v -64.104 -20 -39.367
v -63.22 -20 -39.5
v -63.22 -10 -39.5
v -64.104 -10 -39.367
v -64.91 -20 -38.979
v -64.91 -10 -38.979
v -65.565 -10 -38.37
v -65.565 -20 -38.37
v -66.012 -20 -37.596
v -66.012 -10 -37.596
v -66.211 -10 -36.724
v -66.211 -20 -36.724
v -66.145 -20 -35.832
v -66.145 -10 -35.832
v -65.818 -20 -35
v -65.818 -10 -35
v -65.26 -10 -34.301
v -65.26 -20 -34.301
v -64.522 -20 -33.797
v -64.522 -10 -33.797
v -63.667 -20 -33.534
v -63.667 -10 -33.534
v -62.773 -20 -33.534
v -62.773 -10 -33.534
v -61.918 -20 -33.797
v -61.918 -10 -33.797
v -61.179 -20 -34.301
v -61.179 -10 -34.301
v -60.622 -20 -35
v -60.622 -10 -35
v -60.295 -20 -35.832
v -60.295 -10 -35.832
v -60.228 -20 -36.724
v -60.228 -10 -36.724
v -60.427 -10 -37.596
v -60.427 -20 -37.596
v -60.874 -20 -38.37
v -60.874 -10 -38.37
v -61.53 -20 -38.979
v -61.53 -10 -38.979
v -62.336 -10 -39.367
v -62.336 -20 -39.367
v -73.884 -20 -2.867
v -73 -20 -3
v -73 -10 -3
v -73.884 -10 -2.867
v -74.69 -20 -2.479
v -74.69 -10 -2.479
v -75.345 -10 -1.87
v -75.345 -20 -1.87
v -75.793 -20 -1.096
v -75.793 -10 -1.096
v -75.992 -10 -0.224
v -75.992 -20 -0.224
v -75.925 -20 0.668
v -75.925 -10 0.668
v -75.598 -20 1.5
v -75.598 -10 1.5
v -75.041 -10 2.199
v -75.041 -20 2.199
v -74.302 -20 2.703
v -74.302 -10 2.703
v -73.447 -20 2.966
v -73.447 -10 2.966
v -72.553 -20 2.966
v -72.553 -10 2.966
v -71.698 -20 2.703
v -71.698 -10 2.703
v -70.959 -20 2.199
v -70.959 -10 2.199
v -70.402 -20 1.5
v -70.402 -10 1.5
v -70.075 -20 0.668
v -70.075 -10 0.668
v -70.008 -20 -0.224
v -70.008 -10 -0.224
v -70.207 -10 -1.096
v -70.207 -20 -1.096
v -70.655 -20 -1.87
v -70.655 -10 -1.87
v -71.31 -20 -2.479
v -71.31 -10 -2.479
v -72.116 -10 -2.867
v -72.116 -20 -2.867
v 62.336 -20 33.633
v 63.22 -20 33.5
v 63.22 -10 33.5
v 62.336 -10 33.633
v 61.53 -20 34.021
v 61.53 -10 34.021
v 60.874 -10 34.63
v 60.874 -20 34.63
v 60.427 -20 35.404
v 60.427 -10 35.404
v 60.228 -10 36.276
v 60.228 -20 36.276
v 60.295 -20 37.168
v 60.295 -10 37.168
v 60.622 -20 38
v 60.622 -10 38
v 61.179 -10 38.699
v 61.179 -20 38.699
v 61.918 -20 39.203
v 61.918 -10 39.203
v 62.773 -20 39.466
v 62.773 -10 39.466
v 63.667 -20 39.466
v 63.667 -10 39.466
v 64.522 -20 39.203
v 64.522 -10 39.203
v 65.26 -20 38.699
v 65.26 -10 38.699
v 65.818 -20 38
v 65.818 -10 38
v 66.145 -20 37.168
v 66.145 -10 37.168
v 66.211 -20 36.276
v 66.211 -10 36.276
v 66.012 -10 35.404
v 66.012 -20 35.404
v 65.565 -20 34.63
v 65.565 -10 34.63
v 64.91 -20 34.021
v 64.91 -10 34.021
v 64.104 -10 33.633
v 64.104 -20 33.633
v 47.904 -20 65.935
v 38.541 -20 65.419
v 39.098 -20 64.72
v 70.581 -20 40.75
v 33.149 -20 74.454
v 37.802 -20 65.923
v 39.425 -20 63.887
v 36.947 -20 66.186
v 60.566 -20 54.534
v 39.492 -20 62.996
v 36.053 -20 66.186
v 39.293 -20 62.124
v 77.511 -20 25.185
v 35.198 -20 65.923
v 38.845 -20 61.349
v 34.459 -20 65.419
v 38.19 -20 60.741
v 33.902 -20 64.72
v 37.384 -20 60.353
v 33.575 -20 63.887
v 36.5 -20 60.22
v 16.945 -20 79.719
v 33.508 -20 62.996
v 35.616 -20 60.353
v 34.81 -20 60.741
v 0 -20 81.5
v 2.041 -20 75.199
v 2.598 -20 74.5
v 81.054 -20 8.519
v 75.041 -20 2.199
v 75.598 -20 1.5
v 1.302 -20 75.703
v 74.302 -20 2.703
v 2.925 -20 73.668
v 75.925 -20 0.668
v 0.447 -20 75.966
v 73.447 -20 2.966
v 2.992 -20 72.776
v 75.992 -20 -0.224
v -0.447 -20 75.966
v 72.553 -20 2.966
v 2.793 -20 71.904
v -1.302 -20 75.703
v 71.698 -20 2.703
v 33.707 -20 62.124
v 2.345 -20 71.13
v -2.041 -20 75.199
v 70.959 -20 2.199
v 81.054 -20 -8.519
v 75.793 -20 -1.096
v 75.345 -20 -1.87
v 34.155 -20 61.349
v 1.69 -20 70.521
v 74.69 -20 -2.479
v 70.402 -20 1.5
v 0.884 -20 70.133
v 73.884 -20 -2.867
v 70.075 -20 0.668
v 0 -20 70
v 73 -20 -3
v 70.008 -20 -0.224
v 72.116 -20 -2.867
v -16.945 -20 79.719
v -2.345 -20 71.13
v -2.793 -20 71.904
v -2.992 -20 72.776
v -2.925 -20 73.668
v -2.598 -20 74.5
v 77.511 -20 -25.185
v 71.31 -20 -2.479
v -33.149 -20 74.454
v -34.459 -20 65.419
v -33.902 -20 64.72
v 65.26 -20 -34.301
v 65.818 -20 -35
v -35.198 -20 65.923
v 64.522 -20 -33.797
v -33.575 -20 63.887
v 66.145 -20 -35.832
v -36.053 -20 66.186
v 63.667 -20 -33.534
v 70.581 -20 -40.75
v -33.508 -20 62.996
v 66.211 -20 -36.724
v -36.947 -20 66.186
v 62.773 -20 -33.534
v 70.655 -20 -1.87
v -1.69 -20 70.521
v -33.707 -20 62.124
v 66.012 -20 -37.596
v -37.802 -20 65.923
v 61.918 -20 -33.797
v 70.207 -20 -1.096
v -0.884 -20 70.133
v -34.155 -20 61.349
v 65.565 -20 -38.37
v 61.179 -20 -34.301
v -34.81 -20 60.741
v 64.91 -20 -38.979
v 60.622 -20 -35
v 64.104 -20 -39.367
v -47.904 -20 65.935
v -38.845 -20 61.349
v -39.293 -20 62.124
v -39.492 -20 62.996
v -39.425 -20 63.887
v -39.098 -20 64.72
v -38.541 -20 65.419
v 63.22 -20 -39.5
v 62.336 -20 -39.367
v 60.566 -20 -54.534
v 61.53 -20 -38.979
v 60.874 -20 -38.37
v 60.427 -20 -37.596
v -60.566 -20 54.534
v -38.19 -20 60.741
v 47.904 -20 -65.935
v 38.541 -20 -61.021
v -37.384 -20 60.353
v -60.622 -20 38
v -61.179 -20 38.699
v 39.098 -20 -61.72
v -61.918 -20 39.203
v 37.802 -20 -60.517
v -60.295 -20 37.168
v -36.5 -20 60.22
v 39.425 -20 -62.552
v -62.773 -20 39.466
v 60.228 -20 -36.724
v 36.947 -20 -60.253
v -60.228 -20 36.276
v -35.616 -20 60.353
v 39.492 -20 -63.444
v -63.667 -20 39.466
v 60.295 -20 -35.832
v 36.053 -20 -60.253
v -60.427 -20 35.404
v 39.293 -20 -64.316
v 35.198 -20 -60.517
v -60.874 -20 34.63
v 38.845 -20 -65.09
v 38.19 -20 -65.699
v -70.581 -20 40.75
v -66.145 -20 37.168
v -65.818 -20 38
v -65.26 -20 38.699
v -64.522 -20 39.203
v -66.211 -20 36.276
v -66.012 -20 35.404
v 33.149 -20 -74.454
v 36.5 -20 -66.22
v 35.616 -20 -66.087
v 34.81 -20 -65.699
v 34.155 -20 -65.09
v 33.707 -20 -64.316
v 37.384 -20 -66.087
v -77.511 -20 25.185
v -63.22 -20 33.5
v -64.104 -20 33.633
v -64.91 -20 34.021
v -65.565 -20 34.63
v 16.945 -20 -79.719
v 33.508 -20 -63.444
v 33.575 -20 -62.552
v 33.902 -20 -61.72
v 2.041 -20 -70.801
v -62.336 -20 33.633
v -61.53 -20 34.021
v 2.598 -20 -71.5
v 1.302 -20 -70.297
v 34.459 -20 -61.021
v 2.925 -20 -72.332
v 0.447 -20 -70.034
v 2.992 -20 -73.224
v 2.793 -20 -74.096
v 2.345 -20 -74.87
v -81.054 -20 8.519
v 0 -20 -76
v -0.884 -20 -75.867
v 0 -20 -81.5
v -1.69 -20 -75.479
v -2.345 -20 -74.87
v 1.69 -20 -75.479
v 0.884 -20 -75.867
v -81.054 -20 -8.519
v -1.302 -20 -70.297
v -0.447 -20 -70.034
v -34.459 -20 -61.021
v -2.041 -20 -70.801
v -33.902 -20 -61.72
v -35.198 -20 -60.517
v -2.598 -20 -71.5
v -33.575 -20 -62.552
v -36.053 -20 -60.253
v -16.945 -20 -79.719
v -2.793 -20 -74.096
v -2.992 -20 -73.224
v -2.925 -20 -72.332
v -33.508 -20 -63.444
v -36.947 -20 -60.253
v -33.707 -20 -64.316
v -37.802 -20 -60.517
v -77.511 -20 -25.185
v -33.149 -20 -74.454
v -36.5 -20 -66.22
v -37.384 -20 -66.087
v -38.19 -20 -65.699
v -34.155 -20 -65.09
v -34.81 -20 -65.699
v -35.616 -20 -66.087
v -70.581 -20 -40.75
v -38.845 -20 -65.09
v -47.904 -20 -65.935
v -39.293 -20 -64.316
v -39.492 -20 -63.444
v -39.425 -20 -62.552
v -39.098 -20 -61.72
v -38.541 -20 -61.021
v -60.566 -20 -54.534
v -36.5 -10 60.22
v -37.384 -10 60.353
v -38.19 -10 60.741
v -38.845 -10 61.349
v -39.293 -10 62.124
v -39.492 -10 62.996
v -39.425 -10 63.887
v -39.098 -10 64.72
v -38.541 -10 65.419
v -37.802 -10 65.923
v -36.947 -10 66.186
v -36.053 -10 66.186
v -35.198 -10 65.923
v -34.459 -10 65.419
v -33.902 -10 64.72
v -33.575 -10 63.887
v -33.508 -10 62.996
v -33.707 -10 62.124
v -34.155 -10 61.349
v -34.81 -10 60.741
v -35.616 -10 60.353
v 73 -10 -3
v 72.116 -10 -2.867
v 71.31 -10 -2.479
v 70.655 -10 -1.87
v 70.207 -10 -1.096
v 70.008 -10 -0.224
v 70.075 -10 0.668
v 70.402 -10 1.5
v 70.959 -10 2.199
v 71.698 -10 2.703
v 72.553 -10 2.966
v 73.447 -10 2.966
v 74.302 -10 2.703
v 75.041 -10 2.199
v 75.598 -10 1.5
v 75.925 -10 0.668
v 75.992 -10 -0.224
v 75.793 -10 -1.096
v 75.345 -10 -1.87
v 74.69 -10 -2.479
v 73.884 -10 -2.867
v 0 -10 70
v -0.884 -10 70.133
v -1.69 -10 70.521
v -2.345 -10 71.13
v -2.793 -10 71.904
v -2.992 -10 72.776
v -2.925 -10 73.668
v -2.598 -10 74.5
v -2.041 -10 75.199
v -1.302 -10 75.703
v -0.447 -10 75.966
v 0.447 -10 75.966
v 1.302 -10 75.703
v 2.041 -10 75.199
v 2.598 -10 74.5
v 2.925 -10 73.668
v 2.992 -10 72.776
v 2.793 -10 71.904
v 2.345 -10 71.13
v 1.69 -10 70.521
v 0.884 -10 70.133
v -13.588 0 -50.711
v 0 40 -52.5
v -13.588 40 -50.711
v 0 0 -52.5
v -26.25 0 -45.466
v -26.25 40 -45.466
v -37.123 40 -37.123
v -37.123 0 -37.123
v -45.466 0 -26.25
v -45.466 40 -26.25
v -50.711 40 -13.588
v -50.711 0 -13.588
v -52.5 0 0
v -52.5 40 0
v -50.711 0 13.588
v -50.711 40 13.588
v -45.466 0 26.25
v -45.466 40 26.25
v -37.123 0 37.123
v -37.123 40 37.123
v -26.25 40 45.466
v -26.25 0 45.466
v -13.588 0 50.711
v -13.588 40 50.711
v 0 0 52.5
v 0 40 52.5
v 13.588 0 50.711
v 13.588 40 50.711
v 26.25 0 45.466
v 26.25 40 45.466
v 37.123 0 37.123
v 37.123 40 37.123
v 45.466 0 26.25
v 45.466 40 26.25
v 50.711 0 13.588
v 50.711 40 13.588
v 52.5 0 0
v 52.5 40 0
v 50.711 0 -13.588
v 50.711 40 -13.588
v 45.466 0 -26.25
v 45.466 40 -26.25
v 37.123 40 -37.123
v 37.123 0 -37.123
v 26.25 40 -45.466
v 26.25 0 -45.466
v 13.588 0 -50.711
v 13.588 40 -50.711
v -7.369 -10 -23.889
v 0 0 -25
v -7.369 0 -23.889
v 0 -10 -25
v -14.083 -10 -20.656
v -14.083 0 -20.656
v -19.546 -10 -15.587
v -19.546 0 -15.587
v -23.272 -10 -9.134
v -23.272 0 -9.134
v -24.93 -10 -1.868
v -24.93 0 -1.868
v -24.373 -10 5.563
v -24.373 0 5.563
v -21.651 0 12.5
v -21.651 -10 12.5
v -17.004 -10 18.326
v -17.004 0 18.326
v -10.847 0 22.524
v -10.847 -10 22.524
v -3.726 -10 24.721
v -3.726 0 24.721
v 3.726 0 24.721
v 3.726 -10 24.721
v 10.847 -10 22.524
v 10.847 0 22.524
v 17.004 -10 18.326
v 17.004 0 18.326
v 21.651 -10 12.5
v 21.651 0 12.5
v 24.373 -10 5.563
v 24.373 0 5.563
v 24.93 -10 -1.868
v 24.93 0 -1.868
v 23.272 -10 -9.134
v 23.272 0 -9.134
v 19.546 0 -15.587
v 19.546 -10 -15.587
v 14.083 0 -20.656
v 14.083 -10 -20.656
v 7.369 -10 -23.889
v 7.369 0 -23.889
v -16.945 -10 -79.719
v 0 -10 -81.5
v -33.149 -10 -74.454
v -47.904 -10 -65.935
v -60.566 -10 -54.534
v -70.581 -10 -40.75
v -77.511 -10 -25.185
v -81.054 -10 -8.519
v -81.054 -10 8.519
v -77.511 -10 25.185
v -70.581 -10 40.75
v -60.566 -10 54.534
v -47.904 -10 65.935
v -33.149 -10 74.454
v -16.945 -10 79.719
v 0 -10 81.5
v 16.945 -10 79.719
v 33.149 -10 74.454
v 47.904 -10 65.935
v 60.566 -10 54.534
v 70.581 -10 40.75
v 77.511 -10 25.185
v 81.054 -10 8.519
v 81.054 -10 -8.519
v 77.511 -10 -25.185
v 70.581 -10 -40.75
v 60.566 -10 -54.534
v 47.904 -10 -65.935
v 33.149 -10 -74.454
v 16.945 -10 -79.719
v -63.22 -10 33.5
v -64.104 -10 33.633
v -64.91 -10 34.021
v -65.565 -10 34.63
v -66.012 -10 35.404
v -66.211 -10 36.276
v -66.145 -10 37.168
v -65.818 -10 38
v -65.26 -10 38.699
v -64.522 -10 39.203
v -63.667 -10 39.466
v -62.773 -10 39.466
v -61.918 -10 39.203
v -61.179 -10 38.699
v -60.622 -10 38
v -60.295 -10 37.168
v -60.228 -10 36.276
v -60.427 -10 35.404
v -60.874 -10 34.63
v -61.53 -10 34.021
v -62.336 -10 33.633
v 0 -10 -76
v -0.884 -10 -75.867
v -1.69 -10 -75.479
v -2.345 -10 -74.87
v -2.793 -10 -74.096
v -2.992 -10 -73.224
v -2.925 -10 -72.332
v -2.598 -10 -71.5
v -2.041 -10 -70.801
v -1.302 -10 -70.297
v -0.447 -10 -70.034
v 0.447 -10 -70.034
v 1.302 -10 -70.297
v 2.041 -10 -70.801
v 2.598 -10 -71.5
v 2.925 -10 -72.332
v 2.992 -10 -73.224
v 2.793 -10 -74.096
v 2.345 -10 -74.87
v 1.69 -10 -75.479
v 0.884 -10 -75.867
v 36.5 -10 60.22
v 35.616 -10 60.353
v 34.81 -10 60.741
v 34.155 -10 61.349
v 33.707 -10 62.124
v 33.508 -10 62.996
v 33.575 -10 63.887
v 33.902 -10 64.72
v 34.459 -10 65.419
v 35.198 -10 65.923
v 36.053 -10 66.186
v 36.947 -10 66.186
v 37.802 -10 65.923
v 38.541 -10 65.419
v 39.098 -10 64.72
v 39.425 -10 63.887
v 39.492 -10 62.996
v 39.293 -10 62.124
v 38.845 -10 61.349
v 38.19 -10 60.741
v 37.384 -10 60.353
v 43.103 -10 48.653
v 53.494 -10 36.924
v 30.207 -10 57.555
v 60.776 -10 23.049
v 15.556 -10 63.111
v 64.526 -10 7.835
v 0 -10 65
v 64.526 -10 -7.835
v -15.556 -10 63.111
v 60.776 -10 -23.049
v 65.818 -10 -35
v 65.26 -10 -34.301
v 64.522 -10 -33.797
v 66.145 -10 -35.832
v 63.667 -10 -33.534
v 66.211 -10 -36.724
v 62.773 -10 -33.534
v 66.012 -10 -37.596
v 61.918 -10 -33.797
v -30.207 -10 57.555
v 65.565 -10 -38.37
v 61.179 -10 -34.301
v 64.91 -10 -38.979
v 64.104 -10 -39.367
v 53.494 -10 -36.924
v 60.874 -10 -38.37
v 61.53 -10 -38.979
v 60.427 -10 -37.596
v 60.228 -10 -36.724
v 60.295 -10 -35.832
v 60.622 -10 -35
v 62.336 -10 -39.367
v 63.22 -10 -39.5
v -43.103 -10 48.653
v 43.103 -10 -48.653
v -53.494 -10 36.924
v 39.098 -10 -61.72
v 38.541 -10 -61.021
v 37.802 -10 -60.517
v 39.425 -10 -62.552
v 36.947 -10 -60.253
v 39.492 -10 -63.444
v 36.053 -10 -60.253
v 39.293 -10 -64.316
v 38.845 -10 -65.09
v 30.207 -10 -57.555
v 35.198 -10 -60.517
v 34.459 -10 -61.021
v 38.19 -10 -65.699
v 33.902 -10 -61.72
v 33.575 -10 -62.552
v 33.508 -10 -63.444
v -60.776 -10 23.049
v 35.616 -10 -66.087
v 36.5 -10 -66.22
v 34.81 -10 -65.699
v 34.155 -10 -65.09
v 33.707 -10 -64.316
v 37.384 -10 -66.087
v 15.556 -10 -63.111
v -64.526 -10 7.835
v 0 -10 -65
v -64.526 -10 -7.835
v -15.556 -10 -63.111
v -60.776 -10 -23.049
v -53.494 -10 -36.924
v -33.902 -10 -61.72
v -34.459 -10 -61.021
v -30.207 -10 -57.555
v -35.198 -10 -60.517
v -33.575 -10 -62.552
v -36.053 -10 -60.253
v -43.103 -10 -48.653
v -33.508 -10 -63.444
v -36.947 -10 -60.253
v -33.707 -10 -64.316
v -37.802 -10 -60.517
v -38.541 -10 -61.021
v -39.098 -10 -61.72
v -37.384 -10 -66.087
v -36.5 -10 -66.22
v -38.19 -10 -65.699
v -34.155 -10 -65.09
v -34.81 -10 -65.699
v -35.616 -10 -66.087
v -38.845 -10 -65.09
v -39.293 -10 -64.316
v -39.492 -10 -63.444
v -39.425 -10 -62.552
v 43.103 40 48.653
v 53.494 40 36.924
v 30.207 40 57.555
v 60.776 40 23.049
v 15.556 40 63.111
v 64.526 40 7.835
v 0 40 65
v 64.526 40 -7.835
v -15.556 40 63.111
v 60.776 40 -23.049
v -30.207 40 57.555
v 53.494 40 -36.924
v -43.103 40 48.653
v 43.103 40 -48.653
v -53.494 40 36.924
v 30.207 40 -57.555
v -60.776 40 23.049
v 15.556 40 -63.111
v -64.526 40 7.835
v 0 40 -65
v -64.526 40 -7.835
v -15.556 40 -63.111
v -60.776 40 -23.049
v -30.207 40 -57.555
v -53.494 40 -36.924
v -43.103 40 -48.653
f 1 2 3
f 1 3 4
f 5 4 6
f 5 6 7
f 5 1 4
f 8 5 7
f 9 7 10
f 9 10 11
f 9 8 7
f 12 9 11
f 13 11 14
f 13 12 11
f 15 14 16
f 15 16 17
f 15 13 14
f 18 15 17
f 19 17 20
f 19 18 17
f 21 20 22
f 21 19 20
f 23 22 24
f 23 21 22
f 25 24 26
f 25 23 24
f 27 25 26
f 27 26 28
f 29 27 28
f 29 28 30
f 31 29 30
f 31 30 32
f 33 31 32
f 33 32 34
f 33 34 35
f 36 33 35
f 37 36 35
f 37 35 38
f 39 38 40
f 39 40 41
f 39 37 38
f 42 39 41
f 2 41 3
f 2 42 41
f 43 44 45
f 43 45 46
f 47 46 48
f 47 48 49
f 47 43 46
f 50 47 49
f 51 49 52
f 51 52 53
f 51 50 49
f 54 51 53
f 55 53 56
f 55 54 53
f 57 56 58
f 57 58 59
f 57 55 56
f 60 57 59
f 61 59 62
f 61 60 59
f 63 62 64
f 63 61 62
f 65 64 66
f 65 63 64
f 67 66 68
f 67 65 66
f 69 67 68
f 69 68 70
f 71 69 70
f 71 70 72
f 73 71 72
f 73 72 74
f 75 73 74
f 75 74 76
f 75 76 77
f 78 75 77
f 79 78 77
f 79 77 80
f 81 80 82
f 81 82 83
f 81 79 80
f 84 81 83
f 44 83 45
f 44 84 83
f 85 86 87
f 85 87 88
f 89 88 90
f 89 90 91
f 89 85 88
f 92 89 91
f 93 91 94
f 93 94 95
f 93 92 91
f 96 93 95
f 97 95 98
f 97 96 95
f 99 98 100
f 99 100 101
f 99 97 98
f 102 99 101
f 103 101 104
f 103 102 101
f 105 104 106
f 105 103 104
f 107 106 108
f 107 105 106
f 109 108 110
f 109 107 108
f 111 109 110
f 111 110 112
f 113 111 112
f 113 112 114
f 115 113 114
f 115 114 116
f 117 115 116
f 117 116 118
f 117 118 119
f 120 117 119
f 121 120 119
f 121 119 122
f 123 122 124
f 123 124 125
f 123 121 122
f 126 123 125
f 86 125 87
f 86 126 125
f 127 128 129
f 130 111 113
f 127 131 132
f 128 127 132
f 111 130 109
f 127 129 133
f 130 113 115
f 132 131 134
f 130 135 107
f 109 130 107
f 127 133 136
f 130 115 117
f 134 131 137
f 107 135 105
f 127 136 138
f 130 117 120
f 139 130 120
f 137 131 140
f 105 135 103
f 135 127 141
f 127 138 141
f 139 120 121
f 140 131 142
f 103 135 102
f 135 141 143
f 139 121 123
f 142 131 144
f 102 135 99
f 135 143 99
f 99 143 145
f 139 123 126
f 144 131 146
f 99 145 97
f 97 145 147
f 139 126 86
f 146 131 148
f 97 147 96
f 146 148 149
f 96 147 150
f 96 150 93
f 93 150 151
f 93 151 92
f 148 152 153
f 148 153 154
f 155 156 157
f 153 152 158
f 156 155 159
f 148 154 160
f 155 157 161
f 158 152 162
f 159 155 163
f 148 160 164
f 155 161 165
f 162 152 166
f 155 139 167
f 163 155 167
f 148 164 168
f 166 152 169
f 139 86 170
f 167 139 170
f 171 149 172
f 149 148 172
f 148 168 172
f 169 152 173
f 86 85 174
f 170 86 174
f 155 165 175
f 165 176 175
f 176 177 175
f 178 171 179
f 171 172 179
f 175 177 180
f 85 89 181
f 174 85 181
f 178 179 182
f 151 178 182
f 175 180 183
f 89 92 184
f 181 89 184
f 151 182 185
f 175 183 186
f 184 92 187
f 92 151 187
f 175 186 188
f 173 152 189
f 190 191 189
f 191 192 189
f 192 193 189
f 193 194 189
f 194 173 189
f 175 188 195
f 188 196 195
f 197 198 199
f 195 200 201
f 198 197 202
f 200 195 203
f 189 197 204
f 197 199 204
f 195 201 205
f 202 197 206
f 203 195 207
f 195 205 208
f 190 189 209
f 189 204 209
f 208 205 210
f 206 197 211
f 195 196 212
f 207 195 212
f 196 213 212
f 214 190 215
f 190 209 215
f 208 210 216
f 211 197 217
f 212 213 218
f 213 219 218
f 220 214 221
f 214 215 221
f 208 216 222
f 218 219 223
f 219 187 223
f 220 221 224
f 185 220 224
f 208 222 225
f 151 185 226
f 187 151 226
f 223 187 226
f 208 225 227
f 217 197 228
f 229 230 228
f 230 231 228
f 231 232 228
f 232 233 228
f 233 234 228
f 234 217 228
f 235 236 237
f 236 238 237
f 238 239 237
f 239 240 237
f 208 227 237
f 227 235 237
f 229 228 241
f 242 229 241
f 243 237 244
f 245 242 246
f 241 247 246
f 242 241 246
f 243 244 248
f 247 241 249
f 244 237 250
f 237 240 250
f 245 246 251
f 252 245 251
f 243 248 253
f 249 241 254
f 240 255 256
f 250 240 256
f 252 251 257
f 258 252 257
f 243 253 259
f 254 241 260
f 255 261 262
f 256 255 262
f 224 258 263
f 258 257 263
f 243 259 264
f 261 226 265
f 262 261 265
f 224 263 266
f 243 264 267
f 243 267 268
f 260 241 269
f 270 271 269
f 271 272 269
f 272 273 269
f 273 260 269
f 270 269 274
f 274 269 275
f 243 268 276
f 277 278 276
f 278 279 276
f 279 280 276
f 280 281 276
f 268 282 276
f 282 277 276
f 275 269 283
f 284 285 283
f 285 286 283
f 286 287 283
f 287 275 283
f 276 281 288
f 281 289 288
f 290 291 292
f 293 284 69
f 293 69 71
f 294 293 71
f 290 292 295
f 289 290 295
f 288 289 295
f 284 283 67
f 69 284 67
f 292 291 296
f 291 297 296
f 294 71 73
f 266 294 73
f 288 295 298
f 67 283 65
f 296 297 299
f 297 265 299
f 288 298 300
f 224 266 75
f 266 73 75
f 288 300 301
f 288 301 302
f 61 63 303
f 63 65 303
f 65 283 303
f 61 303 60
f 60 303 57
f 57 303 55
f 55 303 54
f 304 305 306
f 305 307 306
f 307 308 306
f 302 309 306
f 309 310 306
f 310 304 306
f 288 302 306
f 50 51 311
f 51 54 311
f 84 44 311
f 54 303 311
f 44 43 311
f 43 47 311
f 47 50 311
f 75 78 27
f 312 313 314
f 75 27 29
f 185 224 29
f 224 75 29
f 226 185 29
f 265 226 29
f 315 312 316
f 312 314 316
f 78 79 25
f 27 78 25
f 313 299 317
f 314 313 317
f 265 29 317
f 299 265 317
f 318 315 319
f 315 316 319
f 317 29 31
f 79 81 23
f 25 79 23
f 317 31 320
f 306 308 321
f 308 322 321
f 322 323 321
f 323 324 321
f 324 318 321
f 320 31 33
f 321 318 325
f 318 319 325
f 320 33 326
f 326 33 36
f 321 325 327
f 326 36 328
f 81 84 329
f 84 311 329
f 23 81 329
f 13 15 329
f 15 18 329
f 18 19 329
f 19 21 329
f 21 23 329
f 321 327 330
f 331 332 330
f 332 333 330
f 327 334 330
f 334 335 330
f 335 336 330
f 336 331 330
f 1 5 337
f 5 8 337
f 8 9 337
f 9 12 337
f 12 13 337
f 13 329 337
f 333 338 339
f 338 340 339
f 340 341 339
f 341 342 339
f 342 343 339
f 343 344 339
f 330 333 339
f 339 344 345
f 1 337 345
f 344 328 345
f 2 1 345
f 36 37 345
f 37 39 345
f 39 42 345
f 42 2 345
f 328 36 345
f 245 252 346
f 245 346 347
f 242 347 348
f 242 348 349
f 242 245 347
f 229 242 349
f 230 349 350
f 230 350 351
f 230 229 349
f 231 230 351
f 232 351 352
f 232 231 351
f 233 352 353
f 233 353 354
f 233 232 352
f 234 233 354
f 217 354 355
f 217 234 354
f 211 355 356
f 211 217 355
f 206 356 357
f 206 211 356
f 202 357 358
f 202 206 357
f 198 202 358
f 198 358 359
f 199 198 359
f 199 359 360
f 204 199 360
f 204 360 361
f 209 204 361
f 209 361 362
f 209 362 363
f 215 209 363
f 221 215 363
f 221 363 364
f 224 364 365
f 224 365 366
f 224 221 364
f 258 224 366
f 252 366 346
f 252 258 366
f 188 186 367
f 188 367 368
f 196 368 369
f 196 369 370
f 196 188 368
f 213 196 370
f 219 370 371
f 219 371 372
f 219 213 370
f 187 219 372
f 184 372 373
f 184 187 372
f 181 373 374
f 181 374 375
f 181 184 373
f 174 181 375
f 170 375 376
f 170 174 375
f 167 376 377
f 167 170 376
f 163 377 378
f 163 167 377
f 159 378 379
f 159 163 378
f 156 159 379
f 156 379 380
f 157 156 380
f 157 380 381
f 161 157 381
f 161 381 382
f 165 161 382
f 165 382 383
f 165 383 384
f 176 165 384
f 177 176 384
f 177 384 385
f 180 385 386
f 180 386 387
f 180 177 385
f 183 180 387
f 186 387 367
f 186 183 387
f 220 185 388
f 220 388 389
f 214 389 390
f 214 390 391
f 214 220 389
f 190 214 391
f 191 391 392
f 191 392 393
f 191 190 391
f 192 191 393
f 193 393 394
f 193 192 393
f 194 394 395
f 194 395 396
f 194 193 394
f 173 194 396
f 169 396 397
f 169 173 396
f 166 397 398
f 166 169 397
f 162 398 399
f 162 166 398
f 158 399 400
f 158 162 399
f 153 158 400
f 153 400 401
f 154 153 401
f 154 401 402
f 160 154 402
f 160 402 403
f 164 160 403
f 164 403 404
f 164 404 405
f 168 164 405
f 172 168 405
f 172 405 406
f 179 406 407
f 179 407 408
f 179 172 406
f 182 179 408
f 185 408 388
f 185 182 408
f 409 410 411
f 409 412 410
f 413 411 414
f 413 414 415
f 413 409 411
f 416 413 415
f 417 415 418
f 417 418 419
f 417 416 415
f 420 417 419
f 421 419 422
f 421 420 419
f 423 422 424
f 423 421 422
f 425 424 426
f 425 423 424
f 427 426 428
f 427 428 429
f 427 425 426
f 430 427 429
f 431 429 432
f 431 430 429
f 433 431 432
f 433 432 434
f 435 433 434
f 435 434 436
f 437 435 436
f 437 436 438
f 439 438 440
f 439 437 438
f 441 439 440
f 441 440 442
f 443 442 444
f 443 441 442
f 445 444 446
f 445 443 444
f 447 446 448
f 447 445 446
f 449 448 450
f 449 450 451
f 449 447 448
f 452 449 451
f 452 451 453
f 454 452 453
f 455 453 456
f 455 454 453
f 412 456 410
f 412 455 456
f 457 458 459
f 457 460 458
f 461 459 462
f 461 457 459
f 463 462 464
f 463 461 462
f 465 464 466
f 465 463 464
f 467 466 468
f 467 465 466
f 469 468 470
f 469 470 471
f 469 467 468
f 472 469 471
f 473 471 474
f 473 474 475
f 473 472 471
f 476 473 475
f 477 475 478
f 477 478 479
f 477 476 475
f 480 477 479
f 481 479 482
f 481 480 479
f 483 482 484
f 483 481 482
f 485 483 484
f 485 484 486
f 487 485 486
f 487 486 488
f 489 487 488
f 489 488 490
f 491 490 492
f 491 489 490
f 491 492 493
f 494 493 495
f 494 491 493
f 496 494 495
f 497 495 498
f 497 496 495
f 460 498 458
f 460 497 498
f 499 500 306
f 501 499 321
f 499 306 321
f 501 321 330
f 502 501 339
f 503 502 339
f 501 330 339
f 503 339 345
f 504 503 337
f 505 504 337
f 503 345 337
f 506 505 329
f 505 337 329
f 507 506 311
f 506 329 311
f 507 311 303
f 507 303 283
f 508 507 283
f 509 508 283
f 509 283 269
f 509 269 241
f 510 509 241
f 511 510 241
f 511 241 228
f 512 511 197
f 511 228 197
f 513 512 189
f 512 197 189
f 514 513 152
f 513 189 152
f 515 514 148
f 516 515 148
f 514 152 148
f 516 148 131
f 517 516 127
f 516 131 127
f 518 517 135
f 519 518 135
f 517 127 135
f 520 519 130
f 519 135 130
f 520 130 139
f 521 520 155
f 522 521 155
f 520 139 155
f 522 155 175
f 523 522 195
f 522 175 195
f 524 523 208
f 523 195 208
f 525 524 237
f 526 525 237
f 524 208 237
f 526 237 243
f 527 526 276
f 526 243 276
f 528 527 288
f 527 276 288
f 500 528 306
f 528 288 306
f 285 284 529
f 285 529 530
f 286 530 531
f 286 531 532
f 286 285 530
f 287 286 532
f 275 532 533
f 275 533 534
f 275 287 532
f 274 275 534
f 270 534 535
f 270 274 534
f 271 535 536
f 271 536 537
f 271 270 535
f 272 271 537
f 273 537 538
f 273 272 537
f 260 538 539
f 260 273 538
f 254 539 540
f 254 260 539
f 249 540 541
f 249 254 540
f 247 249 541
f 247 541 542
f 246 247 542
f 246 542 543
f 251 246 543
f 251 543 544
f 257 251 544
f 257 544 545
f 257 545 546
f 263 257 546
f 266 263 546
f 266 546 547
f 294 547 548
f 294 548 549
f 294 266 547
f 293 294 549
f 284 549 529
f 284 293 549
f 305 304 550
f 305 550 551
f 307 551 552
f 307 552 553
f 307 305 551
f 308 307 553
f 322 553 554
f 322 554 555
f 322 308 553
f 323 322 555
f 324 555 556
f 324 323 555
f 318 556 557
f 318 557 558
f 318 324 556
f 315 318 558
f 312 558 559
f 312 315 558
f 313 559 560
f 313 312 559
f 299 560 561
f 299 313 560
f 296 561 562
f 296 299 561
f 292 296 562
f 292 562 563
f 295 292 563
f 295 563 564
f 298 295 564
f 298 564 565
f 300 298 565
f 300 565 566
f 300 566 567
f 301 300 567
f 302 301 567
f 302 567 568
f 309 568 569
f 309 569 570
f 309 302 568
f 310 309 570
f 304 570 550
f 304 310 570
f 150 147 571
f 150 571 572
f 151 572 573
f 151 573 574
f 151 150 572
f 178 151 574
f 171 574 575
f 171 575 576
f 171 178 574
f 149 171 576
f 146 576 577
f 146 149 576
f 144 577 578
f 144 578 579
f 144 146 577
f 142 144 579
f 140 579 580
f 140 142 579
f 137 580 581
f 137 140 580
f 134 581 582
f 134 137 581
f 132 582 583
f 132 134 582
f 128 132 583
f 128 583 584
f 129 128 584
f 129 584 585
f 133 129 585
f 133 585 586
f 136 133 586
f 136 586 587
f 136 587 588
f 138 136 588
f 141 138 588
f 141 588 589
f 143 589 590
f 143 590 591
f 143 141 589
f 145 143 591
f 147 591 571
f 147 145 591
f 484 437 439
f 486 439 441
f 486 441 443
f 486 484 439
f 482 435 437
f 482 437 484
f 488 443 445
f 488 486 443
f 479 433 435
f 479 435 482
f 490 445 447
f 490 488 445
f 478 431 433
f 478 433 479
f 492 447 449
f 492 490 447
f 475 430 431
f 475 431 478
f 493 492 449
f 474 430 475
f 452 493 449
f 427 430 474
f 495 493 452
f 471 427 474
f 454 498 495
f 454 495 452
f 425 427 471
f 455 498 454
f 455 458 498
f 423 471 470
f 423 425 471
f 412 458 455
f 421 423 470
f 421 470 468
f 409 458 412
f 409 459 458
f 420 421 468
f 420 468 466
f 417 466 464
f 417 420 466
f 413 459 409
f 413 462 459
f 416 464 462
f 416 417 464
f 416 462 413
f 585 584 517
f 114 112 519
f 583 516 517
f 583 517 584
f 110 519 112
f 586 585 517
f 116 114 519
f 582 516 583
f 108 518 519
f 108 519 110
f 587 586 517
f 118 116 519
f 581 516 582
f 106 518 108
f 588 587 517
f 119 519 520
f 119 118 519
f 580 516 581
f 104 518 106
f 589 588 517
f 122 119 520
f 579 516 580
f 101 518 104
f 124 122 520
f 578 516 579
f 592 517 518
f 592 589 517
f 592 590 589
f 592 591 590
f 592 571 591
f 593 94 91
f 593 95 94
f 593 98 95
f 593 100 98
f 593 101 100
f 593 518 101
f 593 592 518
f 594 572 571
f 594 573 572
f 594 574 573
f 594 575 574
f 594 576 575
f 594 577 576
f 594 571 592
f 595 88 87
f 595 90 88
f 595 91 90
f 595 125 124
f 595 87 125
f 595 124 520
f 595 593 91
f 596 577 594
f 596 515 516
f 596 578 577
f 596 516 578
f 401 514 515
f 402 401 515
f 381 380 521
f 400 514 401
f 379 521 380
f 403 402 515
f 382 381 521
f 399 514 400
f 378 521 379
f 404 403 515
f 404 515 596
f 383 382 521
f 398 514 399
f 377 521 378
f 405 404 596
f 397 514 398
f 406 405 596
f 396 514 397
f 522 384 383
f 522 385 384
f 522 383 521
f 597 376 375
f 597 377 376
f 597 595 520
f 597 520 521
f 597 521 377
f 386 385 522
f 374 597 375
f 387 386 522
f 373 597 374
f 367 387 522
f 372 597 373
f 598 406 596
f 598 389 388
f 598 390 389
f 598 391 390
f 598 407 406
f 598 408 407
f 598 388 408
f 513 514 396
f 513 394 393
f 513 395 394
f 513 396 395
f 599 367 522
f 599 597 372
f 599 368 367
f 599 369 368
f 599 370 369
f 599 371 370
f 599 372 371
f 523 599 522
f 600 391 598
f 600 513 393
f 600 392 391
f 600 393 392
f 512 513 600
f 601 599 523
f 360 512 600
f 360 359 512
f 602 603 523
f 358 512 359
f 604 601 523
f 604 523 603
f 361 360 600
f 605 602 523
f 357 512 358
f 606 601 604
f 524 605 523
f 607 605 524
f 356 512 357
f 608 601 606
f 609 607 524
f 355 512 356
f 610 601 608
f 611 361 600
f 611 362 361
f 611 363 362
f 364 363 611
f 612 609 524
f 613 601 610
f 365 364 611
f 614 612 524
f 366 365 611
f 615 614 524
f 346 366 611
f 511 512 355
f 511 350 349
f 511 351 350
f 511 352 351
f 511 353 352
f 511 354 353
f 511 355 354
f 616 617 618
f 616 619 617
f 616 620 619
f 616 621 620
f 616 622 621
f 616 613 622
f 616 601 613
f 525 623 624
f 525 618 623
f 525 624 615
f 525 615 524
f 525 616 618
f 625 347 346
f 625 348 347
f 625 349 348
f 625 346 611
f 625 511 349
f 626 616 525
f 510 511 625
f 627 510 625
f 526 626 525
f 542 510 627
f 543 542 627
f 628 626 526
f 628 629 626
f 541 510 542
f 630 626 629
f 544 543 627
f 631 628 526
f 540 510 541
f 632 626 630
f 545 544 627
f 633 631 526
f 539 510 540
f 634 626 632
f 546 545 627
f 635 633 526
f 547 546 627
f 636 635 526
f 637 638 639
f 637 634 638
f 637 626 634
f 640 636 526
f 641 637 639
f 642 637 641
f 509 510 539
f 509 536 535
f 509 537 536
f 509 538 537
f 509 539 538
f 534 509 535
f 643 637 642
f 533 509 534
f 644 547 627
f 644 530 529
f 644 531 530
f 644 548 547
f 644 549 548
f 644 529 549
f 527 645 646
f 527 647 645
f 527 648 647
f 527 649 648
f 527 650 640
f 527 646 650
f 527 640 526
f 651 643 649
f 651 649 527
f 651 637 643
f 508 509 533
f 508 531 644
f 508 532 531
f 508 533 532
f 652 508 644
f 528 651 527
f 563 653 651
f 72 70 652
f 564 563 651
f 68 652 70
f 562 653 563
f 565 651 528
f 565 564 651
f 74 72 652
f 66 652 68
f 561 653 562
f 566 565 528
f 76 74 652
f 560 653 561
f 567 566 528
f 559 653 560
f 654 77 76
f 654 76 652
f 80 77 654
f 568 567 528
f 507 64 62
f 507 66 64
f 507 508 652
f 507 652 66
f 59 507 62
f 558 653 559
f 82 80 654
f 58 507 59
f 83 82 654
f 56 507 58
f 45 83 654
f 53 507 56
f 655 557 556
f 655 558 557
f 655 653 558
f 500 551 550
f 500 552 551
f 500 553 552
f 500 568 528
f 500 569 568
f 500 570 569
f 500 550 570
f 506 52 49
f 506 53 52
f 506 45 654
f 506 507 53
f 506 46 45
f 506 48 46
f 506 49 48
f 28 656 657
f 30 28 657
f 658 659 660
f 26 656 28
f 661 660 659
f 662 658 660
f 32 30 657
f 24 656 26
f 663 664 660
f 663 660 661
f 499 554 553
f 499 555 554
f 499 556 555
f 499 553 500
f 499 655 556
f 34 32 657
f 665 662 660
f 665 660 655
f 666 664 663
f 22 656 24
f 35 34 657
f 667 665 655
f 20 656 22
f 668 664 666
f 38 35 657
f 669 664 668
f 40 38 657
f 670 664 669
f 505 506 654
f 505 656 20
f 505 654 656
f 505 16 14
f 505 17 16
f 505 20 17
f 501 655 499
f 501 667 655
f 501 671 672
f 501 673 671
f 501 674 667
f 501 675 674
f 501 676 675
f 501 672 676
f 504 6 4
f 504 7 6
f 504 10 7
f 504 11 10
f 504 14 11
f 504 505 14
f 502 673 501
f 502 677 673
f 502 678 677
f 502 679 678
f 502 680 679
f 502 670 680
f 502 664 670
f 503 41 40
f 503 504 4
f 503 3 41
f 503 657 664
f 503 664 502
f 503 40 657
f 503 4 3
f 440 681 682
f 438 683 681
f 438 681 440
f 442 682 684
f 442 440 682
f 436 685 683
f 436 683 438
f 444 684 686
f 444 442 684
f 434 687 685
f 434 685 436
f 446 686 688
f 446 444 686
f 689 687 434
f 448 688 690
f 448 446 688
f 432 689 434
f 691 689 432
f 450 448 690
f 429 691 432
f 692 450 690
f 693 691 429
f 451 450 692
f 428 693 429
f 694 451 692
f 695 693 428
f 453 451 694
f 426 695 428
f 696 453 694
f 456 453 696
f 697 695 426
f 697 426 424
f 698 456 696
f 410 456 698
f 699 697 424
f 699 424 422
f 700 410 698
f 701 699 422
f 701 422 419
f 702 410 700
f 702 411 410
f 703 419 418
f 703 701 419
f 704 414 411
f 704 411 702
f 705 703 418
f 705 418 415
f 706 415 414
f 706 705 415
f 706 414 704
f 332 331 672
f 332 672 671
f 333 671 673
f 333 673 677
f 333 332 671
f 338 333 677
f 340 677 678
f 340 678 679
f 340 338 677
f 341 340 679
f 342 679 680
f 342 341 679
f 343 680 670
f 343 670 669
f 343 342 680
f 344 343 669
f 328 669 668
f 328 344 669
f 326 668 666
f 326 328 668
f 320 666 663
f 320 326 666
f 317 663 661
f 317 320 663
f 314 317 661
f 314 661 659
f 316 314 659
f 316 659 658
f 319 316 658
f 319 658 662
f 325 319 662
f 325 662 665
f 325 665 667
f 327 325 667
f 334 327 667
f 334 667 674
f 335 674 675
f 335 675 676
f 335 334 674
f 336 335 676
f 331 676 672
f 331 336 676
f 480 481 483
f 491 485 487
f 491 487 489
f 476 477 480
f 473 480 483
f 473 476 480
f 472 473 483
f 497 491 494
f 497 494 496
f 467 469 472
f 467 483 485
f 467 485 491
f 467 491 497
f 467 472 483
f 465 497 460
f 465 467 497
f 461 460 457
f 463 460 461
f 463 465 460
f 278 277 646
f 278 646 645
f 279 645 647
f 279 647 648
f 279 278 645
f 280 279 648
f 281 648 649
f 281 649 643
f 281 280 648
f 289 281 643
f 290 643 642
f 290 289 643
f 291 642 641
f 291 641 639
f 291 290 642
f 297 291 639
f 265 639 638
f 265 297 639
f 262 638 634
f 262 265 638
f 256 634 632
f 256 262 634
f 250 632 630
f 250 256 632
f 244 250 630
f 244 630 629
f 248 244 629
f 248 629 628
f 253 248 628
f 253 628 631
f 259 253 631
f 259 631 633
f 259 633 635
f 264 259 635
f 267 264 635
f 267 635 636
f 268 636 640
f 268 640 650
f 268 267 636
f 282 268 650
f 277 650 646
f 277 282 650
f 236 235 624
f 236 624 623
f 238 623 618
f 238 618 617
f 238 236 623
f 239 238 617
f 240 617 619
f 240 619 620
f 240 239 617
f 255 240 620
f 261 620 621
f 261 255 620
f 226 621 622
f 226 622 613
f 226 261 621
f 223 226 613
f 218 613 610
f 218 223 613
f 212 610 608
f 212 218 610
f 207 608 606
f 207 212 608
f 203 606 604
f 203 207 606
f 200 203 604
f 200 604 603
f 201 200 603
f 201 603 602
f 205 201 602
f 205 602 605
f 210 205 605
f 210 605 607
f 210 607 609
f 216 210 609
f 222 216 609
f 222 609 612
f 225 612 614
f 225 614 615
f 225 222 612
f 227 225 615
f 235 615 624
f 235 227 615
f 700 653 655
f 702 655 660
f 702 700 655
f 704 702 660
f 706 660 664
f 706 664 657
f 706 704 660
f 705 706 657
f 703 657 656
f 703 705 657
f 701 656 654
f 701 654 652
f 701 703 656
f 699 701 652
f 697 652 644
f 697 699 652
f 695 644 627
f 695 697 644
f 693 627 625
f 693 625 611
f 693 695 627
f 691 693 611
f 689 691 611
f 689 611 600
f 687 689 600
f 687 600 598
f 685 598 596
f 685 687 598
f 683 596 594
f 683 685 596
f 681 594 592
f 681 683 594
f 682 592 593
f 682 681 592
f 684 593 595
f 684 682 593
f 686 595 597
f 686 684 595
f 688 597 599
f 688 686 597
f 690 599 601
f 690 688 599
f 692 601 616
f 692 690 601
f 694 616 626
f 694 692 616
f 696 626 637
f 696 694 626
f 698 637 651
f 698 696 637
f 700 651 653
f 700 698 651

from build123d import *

# Parameters (mm, degrees)
BOSS_EXTRUDE1_START = -20
SKETCH2_R           = 81.5
SKETCH2_R_2         = 3
BOSS_EXTRUDE1_DEPTH = 10


with BuildPart() as part:
    # Sketch1 → Revolve1 (revolve)
    with BuildSketch(Plane(origin=(0, 0, 0), x_dir=(0, 0, -1), z_dir=(1, 0, 0))):
        Polygon((25, 0), (25, -10), (0, -10), (0, -20), (65, -20), (65, -10), (65, 40), (52.5, 40), (52.5, 0), align=None)
    revolve(axis=Axis((0, 0, 0), (0, 1, 0)))

    # Sketch2 → Boss-Extrude1 (add)
    with BuildSketch(Plane(origin=(0, 0, 0), x_dir=(1, 0, 0), z_dir=(0, 1, 0)).offset(BOSS_EXTRUDE1_START)):
        with Locations(Location((0, 0, 0), (0, 0, 90))):
            Circle(SKETCH2_R)
        with Locations(Location((0, 73, 0), (0, 0, 90))):
            Circle(SKETCH2_R_2, mode=Mode.SUBTRACT)
        with Locations(Location((36.5, 63.219854476, 0), (0, 0, 90))):
            Circle(SKETCH2_R_2, mode=Mode.SUBTRACT)
        with Locations(Location((63.219854476, 36.5, 0), (0, 0, 90))):
            Circle(SKETCH2_R_2, mode=Mode.SUBTRACT)
        with Locations(Location((73, 0, 0), (0, 0, 90))):
            Circle(SKETCH2_R_2, mode=Mode.SUBTRACT)
        with Locations(Location((63.219854476, -36.5, 0), (0, 0, 90))):
            Circle(SKETCH2_R_2, mode=Mode.SUBTRACT)
        with Locations(Location((36.5, -63.219854476, 0), (0, 0, 90))):
            Circle(SKETCH2_R_2, mode=Mode.SUBTRACT)
        with Locations(Location((0, -73, 0), (0, 0, 90))):
            Circle(SKETCH2_R_2, mode=Mode.SUBTRACT)
        with Locations(Location((-36.5, -63.219854476, 0), (0, 0, 90))):
            Circle(SKETCH2_R_2, mode=Mode.SUBTRACT)
        with Locations(Location((-63.219854476, -36.5, 0), (0, 0, 90))):
            Circle(SKETCH2_R_2, mode=Mode.SUBTRACT)
        with Locations(Location((-73, 0, 0), (0, 0, 90))):
            Circle(SKETCH2_R_2, mode=Mode.SUBTRACT)
        with Locations(Location((-63.219854476, 36.5, 0), (0, 0, 90))):
            Circle(SKETCH2_R_2, mode=Mode.SUBTRACT)
        with Locations(Location((-36.5, 63.219854476, 0), (0, 0, 90))):
            Circle(SKETCH2_R_2, mode=Mode.SUBTRACT)
    extrude(amount=BOSS_EXTRUDE1_DEPTH)


solid = part.part
